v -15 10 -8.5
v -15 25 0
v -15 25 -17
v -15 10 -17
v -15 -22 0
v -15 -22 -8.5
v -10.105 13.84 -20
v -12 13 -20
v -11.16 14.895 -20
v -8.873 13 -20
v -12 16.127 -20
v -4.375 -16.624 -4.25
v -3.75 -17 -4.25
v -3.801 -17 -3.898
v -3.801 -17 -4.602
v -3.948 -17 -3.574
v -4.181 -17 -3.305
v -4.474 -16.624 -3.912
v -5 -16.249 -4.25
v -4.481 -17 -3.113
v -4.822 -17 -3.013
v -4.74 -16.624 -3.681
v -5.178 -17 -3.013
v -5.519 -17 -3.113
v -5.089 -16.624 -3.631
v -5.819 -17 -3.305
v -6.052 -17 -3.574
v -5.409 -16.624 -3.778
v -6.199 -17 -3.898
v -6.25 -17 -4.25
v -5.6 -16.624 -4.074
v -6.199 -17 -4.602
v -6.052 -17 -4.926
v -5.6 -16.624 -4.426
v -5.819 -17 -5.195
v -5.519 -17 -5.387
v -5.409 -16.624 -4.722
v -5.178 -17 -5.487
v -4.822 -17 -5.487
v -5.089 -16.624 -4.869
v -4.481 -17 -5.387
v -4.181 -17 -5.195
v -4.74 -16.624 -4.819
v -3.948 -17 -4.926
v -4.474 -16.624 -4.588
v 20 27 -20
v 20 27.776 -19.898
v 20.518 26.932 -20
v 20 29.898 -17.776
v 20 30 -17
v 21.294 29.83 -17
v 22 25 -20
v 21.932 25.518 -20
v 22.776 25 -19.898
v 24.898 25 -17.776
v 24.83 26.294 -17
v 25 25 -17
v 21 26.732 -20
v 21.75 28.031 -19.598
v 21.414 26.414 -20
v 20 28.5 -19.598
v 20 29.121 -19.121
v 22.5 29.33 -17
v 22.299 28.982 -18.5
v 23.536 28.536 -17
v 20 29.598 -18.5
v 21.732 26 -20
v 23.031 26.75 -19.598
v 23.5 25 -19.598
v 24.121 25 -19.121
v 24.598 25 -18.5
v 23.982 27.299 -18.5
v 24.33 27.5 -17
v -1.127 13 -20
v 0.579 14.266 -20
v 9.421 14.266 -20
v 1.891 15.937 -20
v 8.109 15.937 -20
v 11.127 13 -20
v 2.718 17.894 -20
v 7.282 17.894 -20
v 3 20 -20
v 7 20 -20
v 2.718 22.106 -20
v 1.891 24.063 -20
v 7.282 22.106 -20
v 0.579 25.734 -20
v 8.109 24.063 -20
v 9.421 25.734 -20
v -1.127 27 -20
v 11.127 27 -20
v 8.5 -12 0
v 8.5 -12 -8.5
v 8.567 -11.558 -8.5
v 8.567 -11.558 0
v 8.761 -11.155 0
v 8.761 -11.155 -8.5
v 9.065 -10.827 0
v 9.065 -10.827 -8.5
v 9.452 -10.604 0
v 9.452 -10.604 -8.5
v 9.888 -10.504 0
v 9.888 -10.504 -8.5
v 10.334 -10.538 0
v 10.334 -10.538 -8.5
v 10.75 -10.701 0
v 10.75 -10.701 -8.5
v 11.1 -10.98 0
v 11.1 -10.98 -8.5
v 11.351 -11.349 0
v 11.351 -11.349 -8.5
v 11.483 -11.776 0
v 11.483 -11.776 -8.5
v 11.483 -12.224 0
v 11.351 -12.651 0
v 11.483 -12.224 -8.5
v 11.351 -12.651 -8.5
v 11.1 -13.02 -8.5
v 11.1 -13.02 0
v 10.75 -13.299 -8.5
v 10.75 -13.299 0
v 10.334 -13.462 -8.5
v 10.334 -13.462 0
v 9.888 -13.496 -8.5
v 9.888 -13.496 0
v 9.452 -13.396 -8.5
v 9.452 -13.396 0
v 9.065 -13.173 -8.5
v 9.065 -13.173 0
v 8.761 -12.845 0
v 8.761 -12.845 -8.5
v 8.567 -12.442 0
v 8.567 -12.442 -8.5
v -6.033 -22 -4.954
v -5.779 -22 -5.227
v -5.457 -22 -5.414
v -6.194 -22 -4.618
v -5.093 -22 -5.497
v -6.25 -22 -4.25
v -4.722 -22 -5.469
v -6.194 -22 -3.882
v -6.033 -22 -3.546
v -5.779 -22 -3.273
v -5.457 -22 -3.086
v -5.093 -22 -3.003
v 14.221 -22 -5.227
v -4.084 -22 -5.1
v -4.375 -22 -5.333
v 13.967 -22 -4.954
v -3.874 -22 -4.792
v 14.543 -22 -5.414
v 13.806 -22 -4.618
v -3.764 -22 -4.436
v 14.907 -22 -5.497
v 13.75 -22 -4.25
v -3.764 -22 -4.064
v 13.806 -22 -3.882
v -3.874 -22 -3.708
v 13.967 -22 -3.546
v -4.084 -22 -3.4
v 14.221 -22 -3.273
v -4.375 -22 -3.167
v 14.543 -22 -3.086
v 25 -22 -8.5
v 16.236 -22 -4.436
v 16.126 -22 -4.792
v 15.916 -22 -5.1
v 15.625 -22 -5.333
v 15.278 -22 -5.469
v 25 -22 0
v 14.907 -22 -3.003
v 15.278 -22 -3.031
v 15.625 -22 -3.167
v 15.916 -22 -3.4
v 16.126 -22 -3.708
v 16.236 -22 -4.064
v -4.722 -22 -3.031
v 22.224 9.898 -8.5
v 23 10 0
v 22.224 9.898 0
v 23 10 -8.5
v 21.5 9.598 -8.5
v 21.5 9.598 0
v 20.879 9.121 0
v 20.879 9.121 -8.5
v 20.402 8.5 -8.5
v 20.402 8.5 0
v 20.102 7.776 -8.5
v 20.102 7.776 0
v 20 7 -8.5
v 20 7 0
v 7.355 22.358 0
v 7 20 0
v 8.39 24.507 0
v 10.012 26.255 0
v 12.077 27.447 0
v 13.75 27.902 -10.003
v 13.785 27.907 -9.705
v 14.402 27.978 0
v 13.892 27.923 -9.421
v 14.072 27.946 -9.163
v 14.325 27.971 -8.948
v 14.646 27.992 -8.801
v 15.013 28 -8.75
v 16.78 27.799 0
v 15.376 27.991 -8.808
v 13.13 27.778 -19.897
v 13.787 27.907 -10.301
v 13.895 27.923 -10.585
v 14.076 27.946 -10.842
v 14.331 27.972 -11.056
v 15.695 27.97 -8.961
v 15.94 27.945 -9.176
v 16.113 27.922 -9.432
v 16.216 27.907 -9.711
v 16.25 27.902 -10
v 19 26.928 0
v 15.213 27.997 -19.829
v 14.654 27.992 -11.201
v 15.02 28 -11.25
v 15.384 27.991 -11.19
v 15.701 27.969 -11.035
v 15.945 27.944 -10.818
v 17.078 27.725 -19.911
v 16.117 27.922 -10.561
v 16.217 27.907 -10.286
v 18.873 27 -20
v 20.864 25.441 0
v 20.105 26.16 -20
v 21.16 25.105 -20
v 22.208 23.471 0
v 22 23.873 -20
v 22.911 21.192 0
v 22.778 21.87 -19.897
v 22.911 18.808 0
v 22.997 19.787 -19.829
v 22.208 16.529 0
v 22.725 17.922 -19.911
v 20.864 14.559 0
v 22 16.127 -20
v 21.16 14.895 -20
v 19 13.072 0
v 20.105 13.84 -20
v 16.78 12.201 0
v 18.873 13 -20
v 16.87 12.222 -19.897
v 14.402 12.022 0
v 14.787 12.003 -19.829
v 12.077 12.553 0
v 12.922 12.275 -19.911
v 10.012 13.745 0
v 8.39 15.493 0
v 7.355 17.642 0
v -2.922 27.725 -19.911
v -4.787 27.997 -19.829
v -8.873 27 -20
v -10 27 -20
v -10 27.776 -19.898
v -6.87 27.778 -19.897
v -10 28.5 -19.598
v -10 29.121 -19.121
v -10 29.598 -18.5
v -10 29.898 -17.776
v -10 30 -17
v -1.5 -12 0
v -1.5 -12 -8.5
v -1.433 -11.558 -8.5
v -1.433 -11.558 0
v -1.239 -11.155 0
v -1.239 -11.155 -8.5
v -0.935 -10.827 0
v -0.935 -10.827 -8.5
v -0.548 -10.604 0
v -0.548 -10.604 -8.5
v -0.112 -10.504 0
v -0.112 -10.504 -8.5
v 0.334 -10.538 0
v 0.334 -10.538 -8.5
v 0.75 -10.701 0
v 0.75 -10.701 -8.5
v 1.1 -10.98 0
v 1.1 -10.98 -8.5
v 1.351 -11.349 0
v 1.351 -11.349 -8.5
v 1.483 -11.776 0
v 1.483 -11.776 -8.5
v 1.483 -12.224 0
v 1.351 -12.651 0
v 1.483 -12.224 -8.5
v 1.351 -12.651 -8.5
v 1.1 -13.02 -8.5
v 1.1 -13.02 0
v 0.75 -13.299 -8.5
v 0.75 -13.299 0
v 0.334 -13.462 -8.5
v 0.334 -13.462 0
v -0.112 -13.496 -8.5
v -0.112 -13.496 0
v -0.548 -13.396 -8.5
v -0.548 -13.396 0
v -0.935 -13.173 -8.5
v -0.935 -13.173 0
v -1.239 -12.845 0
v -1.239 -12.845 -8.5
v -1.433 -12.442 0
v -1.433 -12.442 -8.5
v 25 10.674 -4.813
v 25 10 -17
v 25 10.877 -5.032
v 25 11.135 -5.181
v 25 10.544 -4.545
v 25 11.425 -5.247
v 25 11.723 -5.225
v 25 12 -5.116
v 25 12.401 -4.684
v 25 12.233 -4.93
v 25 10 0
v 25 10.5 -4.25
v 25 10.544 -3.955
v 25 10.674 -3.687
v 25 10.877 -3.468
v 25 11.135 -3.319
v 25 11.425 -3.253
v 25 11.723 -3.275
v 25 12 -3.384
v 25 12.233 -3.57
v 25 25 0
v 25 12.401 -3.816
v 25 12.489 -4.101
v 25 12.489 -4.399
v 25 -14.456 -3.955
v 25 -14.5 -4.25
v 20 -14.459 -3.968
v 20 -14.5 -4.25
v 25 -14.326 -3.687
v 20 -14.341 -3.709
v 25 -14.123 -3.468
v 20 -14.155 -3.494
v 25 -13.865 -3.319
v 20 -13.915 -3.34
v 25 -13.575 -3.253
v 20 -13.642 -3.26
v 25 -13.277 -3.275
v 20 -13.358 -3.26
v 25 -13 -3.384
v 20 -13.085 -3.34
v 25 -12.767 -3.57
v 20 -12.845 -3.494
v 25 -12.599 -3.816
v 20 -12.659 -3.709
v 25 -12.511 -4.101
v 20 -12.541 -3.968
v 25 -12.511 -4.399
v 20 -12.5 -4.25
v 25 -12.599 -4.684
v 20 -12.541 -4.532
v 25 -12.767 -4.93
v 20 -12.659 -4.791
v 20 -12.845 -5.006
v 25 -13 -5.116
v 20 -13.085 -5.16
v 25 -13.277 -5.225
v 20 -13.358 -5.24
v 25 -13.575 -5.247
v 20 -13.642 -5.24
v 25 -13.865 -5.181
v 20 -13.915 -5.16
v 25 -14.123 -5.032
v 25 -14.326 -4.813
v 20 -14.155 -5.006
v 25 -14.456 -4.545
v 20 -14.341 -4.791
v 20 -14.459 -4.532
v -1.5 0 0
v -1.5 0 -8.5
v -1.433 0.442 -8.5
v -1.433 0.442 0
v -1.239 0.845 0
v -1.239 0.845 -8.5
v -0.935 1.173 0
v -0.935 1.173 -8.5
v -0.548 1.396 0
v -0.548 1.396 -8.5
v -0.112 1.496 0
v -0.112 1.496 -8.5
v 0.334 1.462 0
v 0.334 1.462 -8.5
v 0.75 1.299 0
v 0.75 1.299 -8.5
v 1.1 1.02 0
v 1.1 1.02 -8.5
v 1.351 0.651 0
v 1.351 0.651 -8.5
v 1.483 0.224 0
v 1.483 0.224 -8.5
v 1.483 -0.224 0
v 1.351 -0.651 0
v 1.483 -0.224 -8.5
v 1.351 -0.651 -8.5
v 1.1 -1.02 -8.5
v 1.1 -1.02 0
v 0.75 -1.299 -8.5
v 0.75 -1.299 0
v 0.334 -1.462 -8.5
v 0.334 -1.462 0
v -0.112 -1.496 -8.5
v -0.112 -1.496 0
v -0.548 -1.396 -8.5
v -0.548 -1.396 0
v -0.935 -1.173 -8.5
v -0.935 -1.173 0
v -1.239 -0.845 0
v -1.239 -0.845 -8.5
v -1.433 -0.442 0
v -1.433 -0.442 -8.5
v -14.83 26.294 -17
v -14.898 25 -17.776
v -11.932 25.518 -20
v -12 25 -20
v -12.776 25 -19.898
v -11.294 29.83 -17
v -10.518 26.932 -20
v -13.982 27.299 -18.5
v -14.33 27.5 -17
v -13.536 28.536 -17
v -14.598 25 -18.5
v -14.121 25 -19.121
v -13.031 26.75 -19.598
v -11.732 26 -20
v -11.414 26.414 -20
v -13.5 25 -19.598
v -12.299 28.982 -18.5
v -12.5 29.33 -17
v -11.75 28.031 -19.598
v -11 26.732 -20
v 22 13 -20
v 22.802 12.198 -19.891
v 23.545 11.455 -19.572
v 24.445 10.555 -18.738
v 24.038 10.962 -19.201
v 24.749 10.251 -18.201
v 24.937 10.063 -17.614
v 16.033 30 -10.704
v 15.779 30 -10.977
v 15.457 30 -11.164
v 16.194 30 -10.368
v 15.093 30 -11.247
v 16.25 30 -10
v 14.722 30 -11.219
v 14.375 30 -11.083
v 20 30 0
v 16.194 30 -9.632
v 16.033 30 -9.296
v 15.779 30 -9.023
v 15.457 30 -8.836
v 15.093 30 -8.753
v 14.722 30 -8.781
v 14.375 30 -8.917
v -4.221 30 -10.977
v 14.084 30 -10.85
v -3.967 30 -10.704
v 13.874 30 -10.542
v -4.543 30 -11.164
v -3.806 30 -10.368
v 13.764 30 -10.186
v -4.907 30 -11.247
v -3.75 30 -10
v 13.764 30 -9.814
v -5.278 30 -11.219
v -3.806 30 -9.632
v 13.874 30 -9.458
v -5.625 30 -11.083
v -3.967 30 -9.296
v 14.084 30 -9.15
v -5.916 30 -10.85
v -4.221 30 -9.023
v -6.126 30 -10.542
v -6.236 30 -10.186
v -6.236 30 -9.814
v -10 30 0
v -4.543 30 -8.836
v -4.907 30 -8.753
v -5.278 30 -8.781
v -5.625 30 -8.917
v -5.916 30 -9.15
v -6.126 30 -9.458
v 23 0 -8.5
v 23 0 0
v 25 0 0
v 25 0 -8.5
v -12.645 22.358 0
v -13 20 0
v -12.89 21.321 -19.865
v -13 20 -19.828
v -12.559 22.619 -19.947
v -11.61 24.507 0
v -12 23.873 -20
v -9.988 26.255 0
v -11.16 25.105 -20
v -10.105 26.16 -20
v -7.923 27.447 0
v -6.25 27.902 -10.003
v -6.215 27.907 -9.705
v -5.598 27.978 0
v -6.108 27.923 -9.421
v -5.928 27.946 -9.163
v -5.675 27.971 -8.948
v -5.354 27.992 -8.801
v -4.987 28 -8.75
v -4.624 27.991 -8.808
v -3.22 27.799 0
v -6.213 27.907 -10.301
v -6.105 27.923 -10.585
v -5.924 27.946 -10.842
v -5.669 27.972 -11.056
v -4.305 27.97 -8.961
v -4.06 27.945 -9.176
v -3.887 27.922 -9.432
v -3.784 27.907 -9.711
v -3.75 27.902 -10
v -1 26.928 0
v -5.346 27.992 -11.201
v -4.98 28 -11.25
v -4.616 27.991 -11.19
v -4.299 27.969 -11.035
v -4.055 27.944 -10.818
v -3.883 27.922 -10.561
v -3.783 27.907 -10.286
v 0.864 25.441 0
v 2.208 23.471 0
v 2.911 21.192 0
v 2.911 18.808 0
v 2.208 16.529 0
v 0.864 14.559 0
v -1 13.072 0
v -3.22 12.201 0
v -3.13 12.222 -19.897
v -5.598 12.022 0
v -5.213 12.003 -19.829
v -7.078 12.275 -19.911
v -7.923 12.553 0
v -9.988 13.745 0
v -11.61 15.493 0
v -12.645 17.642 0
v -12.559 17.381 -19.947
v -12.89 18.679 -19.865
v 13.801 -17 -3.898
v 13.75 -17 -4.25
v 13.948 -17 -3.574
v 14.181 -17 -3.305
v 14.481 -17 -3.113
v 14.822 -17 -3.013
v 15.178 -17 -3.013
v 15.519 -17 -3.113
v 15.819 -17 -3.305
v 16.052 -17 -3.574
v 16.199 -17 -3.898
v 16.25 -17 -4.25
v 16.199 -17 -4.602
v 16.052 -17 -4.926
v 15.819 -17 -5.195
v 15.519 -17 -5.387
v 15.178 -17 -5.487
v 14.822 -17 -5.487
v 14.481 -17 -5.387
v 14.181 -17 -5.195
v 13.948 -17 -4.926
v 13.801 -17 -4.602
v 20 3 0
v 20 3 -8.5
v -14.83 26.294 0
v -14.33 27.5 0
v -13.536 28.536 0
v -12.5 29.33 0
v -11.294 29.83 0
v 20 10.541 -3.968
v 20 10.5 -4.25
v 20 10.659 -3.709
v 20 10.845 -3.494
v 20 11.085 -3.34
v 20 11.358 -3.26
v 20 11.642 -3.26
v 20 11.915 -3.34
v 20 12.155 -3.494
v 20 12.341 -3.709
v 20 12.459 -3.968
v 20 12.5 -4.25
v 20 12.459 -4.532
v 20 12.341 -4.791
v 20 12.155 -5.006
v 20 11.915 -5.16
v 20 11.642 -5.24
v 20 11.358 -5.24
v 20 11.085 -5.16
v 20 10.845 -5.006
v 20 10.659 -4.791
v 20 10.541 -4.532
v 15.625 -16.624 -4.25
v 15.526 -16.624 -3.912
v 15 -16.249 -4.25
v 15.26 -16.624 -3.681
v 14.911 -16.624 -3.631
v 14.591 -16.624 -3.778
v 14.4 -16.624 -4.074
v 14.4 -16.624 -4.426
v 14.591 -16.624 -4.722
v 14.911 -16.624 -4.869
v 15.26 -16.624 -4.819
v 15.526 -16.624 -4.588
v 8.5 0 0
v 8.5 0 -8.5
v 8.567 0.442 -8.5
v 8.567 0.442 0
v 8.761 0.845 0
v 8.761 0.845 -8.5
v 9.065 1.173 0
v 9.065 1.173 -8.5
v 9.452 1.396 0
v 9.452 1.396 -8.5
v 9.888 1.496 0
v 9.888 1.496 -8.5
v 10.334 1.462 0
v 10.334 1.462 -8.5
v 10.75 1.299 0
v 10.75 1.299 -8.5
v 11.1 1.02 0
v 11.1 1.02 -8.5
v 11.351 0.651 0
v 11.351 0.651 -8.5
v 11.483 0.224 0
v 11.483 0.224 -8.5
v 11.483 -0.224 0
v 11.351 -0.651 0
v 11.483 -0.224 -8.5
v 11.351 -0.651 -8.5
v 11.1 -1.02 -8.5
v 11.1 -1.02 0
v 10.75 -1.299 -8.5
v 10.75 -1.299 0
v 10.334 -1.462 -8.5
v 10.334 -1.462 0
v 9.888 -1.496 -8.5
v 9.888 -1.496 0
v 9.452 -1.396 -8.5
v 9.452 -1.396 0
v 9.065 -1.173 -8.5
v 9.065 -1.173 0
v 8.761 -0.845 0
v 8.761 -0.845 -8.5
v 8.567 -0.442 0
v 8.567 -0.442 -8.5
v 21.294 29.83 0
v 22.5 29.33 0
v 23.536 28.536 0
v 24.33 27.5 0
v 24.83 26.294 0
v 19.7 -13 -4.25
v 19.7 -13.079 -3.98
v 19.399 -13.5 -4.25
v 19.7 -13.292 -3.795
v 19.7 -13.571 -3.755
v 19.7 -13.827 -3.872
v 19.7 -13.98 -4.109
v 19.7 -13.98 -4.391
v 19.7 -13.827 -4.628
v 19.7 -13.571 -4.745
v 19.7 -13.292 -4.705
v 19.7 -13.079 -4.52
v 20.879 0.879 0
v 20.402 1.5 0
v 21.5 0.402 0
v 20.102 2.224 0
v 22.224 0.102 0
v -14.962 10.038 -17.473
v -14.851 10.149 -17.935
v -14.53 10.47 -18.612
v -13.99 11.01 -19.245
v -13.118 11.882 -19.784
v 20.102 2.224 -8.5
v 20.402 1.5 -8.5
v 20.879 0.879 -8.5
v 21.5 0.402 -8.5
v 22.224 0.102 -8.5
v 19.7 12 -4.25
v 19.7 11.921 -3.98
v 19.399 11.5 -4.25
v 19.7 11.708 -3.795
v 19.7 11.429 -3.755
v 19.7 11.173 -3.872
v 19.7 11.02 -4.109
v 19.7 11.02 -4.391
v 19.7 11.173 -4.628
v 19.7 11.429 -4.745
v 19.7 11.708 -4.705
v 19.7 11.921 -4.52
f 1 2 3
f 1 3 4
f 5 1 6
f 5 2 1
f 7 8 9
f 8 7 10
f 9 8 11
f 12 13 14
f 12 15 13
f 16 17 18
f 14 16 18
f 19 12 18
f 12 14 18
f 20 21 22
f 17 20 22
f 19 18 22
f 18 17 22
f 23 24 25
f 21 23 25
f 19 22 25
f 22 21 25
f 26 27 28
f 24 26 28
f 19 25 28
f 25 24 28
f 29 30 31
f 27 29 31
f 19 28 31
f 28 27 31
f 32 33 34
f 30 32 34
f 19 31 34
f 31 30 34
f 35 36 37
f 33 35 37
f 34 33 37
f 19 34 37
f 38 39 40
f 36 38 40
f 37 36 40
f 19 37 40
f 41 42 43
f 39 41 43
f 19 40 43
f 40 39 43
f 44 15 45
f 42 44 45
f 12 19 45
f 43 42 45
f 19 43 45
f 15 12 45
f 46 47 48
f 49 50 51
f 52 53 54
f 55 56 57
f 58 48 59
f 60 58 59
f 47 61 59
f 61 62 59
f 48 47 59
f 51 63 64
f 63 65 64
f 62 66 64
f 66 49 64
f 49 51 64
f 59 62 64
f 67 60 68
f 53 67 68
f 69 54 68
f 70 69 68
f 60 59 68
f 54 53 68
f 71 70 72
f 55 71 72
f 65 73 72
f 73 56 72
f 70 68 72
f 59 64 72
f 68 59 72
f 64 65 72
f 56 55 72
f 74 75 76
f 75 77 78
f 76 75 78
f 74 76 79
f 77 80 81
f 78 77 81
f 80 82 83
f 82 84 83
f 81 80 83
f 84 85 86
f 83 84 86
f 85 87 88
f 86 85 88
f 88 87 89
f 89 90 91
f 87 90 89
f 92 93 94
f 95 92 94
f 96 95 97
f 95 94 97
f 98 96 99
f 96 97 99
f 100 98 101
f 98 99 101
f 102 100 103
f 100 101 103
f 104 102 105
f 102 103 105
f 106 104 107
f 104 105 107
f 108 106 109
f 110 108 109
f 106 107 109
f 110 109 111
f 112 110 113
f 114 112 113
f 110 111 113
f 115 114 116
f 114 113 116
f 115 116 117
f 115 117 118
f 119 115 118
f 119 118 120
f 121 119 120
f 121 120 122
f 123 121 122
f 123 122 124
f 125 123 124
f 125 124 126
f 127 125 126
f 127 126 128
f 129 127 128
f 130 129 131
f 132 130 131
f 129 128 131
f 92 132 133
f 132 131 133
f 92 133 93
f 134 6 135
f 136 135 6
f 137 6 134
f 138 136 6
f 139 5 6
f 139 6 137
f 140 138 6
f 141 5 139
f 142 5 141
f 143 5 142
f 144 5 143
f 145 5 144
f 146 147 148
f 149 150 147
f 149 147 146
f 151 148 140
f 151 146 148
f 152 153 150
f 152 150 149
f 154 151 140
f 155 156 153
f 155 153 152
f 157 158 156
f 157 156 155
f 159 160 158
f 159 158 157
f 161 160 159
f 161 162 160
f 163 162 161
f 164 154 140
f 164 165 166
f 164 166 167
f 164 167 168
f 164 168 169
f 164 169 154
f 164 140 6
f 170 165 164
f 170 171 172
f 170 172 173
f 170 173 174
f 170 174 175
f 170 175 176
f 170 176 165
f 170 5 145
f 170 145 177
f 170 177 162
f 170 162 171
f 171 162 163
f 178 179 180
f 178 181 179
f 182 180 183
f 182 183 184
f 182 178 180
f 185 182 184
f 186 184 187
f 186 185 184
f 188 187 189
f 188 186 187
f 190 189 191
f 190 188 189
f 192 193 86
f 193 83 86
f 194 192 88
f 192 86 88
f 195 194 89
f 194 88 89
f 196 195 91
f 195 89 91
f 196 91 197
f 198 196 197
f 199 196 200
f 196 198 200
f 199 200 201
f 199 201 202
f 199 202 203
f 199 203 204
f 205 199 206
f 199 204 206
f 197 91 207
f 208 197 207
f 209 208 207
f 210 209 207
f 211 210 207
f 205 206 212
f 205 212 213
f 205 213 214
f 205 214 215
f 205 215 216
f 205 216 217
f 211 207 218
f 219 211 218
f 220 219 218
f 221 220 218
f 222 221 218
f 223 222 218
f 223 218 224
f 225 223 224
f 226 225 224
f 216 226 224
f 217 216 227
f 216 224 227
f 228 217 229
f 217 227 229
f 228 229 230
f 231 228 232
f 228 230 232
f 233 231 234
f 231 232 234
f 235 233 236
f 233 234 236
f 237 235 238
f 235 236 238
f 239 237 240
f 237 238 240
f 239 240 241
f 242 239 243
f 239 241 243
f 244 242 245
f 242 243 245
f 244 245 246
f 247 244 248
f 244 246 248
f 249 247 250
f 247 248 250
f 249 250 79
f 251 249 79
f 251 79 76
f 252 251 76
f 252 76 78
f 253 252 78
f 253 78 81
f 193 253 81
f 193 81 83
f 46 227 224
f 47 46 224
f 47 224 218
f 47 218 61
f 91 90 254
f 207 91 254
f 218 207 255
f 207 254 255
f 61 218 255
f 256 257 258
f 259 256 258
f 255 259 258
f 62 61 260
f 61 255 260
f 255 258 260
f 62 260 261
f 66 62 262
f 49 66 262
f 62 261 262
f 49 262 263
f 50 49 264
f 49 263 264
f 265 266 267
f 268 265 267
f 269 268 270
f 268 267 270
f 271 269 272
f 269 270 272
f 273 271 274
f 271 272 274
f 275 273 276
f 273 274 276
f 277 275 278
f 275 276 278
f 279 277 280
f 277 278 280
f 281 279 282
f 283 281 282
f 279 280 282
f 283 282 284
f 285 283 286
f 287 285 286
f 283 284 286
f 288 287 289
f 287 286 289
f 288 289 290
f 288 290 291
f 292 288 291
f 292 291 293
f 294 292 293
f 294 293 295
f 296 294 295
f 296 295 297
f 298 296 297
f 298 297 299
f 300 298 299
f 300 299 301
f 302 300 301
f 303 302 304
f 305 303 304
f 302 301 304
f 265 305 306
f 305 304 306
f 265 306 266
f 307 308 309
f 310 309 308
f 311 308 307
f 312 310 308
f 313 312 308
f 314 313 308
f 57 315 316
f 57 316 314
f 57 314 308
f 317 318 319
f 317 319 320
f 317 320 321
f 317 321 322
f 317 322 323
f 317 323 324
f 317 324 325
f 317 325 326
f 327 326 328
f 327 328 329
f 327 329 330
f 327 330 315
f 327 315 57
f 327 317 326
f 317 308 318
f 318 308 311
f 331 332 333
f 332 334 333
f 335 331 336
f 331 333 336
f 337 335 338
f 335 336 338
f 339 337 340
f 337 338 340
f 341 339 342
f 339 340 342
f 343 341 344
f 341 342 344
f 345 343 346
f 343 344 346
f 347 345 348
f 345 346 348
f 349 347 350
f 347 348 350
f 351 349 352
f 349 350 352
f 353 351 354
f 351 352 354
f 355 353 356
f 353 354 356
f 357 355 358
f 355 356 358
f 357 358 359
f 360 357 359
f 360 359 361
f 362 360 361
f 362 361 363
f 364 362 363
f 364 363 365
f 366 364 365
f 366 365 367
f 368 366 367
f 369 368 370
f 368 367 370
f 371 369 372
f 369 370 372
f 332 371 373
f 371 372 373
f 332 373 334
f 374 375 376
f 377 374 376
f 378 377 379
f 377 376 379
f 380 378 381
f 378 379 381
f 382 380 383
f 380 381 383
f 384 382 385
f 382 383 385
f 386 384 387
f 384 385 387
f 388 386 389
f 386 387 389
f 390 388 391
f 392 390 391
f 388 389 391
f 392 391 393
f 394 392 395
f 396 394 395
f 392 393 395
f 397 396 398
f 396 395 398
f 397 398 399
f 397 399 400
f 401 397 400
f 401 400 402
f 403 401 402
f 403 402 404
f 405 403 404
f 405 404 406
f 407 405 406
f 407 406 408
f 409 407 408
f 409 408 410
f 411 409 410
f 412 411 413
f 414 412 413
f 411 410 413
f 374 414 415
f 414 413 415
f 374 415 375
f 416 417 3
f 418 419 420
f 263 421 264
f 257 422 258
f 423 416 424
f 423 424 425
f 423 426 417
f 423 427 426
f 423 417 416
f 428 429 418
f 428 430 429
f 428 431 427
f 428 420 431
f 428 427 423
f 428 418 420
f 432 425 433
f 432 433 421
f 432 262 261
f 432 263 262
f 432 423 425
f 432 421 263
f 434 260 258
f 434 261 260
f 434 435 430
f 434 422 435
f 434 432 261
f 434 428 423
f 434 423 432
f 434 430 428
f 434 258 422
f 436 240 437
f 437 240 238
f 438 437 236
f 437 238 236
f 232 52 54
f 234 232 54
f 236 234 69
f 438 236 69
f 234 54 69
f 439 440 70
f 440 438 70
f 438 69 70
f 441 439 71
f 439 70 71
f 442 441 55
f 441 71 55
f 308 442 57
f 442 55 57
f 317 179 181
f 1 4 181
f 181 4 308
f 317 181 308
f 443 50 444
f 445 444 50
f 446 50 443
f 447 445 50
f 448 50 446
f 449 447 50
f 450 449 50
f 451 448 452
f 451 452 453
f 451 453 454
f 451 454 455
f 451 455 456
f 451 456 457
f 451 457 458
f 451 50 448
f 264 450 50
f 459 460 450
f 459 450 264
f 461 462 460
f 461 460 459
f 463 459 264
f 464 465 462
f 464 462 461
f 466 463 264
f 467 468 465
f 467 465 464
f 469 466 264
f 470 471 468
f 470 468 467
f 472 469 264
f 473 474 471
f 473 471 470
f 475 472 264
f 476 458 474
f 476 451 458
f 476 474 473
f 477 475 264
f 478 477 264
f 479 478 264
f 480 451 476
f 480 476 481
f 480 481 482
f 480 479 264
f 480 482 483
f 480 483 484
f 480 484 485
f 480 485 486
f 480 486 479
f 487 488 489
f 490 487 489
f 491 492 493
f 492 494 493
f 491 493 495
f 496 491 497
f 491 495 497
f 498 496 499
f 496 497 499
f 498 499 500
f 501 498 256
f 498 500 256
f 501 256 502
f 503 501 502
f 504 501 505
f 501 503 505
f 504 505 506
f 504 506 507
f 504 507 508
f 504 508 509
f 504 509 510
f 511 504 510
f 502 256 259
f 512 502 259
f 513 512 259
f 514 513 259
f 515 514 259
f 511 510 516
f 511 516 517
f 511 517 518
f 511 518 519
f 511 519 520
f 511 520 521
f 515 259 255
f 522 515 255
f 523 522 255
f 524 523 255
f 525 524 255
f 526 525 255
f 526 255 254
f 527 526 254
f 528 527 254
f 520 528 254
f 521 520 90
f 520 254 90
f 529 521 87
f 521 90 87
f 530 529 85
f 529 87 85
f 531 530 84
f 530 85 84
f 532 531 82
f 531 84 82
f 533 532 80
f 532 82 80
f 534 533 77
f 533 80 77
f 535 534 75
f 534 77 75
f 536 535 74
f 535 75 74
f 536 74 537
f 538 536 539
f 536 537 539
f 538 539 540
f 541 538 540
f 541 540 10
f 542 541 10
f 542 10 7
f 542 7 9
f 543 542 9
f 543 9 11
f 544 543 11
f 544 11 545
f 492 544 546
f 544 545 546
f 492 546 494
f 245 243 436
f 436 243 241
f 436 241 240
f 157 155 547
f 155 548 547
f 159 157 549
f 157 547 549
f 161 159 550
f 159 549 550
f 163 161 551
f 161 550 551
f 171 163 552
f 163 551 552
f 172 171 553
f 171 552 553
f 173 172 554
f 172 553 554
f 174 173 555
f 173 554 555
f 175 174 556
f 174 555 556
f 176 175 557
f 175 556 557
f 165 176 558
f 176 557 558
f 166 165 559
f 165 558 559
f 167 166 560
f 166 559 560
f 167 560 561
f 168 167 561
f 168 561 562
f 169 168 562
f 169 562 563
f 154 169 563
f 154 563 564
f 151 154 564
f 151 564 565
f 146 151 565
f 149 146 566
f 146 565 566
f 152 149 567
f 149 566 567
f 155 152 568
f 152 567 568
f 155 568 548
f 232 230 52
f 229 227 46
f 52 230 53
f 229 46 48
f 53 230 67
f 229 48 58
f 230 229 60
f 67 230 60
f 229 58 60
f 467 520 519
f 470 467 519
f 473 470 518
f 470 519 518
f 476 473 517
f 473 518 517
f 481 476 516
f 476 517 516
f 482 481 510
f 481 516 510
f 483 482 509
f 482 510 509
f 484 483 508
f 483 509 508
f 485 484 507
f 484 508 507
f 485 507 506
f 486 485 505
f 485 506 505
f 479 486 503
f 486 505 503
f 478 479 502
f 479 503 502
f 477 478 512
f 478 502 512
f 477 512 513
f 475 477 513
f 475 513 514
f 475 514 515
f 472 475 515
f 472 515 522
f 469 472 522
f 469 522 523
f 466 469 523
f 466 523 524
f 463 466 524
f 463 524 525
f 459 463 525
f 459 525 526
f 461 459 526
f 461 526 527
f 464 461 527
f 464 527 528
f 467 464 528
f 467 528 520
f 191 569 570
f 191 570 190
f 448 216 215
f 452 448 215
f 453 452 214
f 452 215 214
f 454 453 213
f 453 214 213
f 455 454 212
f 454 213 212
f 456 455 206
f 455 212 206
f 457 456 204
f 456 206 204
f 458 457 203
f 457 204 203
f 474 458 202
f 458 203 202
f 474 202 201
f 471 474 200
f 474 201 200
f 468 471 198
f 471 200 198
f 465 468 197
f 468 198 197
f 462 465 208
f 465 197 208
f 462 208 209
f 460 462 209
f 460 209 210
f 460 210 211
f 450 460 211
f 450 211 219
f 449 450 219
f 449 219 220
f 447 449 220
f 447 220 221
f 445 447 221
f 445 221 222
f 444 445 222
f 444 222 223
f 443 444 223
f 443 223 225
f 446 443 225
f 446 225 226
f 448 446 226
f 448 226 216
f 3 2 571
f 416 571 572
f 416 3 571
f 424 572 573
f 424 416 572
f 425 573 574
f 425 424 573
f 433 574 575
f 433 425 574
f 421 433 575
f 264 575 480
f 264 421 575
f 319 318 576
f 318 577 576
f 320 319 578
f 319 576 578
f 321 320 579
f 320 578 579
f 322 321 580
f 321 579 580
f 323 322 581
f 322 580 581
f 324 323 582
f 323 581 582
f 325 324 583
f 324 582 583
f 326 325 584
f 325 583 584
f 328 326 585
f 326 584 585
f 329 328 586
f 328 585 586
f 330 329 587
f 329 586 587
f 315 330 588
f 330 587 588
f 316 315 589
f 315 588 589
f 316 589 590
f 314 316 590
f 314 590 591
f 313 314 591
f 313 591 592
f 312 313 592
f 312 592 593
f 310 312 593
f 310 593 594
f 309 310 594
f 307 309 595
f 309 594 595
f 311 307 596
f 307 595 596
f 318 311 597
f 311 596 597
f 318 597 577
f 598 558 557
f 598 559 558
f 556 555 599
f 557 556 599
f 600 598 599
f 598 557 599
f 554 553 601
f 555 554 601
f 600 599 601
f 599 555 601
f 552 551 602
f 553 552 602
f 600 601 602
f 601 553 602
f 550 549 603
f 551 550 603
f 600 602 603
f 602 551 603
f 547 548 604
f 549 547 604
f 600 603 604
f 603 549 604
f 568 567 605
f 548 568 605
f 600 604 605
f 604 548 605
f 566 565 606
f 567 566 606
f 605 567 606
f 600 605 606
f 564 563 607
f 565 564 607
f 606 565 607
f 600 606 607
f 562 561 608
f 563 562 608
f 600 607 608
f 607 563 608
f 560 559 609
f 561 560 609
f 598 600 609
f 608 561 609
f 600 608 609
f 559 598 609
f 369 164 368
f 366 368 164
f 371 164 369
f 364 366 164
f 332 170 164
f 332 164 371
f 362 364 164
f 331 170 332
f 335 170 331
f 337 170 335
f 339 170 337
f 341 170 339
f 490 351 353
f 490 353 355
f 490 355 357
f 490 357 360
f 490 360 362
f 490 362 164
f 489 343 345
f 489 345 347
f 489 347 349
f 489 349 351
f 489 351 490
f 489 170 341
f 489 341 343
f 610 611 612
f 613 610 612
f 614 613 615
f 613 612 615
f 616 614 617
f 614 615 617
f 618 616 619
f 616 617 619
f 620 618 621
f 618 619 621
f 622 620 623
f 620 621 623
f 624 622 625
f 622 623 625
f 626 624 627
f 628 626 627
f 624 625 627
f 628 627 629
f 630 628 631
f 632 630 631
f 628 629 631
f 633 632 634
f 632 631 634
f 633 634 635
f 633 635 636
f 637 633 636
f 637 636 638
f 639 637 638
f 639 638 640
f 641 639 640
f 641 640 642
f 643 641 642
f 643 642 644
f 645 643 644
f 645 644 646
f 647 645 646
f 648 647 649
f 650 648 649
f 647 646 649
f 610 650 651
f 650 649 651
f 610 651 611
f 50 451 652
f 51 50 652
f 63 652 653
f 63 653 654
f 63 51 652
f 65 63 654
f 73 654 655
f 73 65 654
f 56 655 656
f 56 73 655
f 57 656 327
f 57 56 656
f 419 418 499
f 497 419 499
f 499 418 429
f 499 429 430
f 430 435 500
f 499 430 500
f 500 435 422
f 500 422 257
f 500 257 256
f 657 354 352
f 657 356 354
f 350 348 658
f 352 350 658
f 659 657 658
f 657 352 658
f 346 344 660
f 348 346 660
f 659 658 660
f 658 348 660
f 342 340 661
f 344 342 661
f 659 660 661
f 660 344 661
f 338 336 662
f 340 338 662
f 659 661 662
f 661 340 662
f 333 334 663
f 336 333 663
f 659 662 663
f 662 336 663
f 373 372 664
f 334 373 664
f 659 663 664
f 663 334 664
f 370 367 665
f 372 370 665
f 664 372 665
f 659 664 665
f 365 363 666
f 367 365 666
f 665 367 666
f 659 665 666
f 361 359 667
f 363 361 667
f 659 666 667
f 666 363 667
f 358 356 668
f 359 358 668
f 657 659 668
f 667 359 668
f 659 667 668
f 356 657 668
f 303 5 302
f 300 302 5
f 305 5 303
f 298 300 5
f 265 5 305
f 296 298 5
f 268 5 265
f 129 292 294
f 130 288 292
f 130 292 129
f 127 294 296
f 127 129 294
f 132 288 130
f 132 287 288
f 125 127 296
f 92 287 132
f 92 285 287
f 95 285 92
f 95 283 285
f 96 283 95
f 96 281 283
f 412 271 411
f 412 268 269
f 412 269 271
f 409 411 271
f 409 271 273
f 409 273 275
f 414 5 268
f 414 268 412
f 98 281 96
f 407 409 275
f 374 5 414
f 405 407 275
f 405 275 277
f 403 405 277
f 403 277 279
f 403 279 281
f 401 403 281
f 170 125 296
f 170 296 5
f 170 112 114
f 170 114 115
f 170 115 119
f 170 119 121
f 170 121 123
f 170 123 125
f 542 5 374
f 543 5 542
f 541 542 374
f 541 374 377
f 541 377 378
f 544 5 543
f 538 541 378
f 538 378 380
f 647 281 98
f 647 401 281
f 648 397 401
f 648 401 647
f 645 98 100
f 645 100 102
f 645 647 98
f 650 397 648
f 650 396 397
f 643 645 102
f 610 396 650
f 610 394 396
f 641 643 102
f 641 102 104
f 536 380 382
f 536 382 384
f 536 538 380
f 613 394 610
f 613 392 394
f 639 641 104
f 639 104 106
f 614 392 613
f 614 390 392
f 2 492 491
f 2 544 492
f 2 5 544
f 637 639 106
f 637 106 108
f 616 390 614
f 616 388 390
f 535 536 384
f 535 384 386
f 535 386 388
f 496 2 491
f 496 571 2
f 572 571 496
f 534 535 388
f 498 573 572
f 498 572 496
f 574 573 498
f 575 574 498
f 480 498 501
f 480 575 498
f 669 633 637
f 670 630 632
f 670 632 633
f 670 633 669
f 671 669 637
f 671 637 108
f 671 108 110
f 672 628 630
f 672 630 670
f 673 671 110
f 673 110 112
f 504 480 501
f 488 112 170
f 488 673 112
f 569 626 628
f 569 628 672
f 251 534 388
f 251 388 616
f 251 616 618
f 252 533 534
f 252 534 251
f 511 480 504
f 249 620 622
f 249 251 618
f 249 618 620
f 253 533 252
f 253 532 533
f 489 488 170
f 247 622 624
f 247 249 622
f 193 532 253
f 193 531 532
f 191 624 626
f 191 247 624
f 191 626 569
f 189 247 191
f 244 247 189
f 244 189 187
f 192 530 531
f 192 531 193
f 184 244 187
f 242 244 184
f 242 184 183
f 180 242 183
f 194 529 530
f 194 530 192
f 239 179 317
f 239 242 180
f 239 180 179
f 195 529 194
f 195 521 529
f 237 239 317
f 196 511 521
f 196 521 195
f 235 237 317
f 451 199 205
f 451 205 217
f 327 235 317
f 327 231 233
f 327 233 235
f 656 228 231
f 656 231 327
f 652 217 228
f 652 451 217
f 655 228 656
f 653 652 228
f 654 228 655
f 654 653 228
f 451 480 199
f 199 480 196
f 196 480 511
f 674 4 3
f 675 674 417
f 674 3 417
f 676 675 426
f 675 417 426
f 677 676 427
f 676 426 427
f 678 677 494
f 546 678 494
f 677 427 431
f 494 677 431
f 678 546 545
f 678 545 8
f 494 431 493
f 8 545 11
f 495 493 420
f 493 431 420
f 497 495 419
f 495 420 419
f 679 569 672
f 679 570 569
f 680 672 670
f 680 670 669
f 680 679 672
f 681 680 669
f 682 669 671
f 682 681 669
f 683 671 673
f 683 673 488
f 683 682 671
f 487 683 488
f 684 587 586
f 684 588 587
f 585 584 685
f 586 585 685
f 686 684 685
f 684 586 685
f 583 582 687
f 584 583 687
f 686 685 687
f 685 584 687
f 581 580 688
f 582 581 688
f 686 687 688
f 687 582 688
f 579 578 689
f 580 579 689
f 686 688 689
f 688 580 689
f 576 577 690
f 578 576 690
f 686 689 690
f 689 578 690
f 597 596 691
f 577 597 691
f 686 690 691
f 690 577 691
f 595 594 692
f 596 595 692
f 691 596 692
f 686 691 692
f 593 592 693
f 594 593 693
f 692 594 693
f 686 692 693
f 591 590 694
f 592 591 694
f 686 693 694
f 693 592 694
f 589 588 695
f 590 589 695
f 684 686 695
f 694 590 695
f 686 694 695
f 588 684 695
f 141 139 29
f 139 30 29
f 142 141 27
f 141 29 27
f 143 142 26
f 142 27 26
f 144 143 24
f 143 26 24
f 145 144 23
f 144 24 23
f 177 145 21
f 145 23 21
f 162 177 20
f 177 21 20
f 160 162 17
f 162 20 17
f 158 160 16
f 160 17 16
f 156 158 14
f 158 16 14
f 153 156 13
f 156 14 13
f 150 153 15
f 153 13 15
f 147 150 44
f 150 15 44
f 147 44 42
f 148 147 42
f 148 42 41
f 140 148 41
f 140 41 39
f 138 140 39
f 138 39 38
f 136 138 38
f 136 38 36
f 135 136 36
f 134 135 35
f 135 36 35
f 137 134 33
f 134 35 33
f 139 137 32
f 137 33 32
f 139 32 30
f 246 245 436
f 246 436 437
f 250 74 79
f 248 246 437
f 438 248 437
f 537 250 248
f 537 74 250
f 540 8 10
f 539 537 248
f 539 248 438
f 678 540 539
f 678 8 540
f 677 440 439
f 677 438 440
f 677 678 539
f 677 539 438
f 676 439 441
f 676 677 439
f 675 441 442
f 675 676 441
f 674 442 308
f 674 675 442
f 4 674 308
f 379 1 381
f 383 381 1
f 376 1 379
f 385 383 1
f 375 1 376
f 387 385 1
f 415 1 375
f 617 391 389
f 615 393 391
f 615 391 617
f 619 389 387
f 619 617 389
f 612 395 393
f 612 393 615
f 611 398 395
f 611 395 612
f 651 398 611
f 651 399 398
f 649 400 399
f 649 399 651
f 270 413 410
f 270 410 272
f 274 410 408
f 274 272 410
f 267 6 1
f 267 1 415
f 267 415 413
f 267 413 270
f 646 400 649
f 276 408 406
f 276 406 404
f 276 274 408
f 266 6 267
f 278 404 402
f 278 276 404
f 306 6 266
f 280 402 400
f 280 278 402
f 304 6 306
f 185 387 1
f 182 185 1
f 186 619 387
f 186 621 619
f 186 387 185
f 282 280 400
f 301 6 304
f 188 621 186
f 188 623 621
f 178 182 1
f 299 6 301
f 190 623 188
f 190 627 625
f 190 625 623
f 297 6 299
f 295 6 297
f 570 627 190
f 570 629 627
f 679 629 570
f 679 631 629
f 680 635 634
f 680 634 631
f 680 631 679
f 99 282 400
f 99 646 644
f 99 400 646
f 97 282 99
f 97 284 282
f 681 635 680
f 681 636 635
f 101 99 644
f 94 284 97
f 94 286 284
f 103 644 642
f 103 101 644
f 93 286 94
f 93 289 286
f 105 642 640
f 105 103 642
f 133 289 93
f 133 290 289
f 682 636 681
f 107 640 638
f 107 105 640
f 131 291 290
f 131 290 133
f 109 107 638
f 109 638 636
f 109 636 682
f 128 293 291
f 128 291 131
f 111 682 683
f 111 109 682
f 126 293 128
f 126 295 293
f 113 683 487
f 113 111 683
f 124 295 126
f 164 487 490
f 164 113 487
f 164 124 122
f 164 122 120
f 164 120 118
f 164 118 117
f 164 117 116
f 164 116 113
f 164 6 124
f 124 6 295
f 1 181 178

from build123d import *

# Parameters (mm, degrees)
F0_W          = 20
F0_H          = 20
F1_DEPTH      = 20
F2_D          = 3
F2_DEPTH      = 20
F2_TIP        = 0.9012909285
F3_D          = 16
F3_DEPTH      = 20
F3_TIP        = 4.8068849522
F4_W          = 40
F4_H          = 32
F4_R          = 1.5
F5_DEPTH      = 11.5
F7_D          = 2.5
F7_DEPTH      = 5
F7_TIP        = 0.7510757738
F8_R          = 5
F10_D         = 2.5
F10_DEPTH     = 5
F10_TIP       = 0.7510757738
F11_T1_DEPTH  = 22.5
F11_T3_DEPTH  = 55
F11_T5_DEPTH  = 30
F11_T8_ANGLE  = 90
F11_T10_ANGLE = 90
F13_W         = 5
F13_H         = 10
F14_DEPTH     = 25
F15_R         = 3
F16_D         = 2
F16_DEPTH     = 5
F16_TIP       = 0.600860619


# Not quite as in the source:
# - a fillet or chamfer that OpenCascade refuses, or shapes differently, is made with other operations: its cross-section is extruded or revolved along the edge and cut away or added


with BuildPart() as f1:
    # F0 (on Top) → F1 (new body)
    with BuildSketch(Plane.XY):
        with Locations((-5, 20)):
            Rectangle(F0_W, F0_H)
        with Locations((15, 20)):
            Rectangle(F0_W, F0_H)
        Polygon((5, 10), (-15, 10), (-15, -22), (25, -22), (25, 10), align=None)
    extrude(amount=-F1_DEPTH)

    # F2
    with Locations(Plane.XY):
        with Locations((10, 0), (0, 0), (0, -12), (10, -12)):
            Hole(F2_D / 2, depth=F2_DEPTH)
            with Locations((0, 0, -(F2_DEPTH + F2_TIP / 2))):  # 118° drill point
                Cone(0, F2_D / 2, F2_TIP, mode=Mode.SUBTRACT)

    # F3
    with Locations(Plane.XY):
        with Locations((15, 20), (-5, 20)):
            Hole(F3_D / 2, depth=F3_DEPTH)
            with Locations((0, 0, -(F3_DEPTH + F3_TIP / 2))):  # 118° drill point
                Cone(0, F3_D / 2, F3_TIP, mode=Mode.SUBTRACT)

    # F4 (on face) → F5 (cut)
    with BuildSketch(Plane(origin=(0, 0, -20), x_dir=(1, 0, 0), z_dir=(0, 0, -1))):
        with Locations((5, 6)):
            Rectangle(F4_W, F4_H)
        Circle(F4_R, mode=Mode.SUBTRACT)
        with Locations((0, 12)):
            Circle(F4_R, mode=Mode.SUBTRACT)
        with Locations((10, 0)):
            Circle(F4_R, mode=Mode.SUBTRACT)
        with Locations((10, 12)):
            Circle(F4_R, mode=Mode.SUBTRACT)
    extrude(amount=-F5_DEPTH, mode=Mode.SUBTRACT)

    # F7
    with Locations(Plane.XZ.offset(22)):
        with Locations((-5, -4.25), (15, -4.25)):
            Hole(F7_D / 2, depth=F7_DEPTH)
            with Locations((0, 0, -(F7_DEPTH + F7_TIP / 2))):  # 118° drill point
                Cone(0, F7_D / 2, F7_TIP, mode=Mode.SUBTRACT)

    # F8
    f8_edges = [f1.edges().sort_by_distance(p)[0] for p in [
        (-15, 30, -10),
        (25, 30, -10),
    ]]
    fillet(f8_edges, radius=F8_R)

    # F10
    with Locations(Plane(origin=(0, 30, 0), x_dir=(-1, 0, 0), z_dir=(0, 1, 0))):
        with Locations((5, -10), (-15, -10)):
            Hole(F10_D / 2, depth=F10_DEPTH)
            with Locations((0, 0, -(F10_DEPTH + F10_TIP / 2))):  # 118° drill point
                Cone(0, F10_D / 2, F10_TIP, mode=Mode.SUBTRACT)

    # F11: fillet of radius 3 on 2 edges, made by hand

    # F11_s2 → F11_t1 (cut)
    with BuildSketch(Plane.XZ.offset(-25)):
        with BuildLine():
            ThreePointArc((-15, -17), (-14.1213203436, -19.1213203436), (-12, -20))
            Line((-12, -20), (-15, -20))
            Line((-15, -20), (-15, -17))
        make_face()
        with BuildLine():
            ThreePointArc((22, -20), (24.1213203436, -19.1213203436), (25, -17))
            Line((25, -17), (25, -20))
            Line((25, -20), (22, -20))
        make_face()
    extrude(amount=F11_T1_DEPTH, mode=Mode.SUBTRACT)

    # F11_s4 → F11_t3 (cut)
    with BuildSketch(Plane.YZ.offset(-22.5)):
        with BuildLine():
            ThreePointArc((13, -20), (10.8786796564, -19.1213203436), (10, -17))
            Line((10, -17), (10, -20))
            Line((10, -20), (13, -20))
        make_face()
    extrude(amount=F11_T3_DEPTH, mode=Mode.SUBTRACT)

    # F11_s6 → F11_t5 (cut)
    with BuildSketch(Plane.YZ.offset(-10)):
        with BuildLine():
            ThreePointArc((27, -20), (29.1213203436, -19.1213203436), (30, -17))
            Line((30, -17), (30, -20))
            Line((30, -20), (27, -20))
        make_face()
    extrude(amount=F11_T5_DEPTH, mode=Mode.SUBTRACT)

    # F11_s7 → F11_t8 (revolve, cut)
    with BuildSketch(Plane.XZ.offset(-25)):
        with BuildLine():
            ThreePointArc((-15, -17), (-14.1213203436, -19.1213203436), (-12, -20))
            Line((-12, -20), (-15, -20))
            Line((-15, -20), (-15, -17))
        make_face()
    revolve(axis=Axis((-10, 25, -20), (0, 0, -1)), revolution_arc=F11_T8_ANGLE, mode=Mode.SUBTRACT)

    # F11_s9 → F11_t10 (revolve, cut)
    with BuildSketch(Plane.YZ.offset(20)):
        with BuildLine():
            ThreePointArc((27, -20), (29.1213203436, -19.1213203436), (30, -17))
            Line((30, -17), (30, -20))
            Line((30, -20), (27, -20))
        make_face()
    revolve(axis=Axis((20, 25, -20), (0, 0, -1)), revolution_arc=F11_T10_ANGLE, mode=Mode.SUBTRACT)

    # F13 (on face) → F14 (cut)
    with BuildSketch(Plane.XY):
        with Locations((22.5, 5)):
            Rectangle(F13_W, F13_H)
    extrude(amount=-F14_DEPTH, mode=Mode.SUBTRACT)

    # F15
    f15_edges = [f1.edges().sort_by_distance(p)[0] for p in [
        (20, 10, -4.25),
        (20, 0, -4.25),
    ]]
    fillet(f15_edges, radius=F15_R)

    # F16
    with Locations(Plane.YZ.offset(25)):
        with Locations((-13.5, -4.25), (11.5, -4.25)):
            Hole(F16_D / 2, depth=F16_DEPTH)
            with Locations((0, 0, -(F16_DEPTH + F16_TIP / 2))):  # 118° drill point
                Cone(0, F16_D / 2, F16_TIP, mode=Mode.SUBTRACT)


solid = f1.part
